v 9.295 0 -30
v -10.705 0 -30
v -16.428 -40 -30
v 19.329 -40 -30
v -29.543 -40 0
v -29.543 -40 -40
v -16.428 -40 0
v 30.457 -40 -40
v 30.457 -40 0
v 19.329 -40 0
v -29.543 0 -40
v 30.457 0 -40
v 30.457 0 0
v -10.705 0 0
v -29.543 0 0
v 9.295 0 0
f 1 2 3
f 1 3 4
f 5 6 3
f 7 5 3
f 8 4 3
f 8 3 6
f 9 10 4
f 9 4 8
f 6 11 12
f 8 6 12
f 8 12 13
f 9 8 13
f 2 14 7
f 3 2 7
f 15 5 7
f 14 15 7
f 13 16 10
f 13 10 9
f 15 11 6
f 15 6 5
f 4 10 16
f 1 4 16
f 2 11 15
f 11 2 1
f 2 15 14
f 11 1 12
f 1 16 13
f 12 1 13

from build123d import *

# Parameters (mm, degrees)
F0_W     = 60
F0_H     = 40
F1_DEPTH = 40
F3_DEPTH = 30


with BuildPart() as f1:
    # F0 (on Front) → F1 (new body)
    with BuildSketch(Plane.XZ):
        with Locations((0.457271, -20)):
            Rectangle(F0_W, F0_H)
    extrude(amount=F1_DEPTH)

    # F2 (on face) → F3 (cut)
    with BuildSketch(Plane.XY):
        Polygon((9.295005, 0), (-10.704995, 0), (-16.427813, -40), (19.328658, -40), align=None)
    extrude(amount=-F3_DEPTH, mode=Mode.SUBTRACT)


solid = f1.part
